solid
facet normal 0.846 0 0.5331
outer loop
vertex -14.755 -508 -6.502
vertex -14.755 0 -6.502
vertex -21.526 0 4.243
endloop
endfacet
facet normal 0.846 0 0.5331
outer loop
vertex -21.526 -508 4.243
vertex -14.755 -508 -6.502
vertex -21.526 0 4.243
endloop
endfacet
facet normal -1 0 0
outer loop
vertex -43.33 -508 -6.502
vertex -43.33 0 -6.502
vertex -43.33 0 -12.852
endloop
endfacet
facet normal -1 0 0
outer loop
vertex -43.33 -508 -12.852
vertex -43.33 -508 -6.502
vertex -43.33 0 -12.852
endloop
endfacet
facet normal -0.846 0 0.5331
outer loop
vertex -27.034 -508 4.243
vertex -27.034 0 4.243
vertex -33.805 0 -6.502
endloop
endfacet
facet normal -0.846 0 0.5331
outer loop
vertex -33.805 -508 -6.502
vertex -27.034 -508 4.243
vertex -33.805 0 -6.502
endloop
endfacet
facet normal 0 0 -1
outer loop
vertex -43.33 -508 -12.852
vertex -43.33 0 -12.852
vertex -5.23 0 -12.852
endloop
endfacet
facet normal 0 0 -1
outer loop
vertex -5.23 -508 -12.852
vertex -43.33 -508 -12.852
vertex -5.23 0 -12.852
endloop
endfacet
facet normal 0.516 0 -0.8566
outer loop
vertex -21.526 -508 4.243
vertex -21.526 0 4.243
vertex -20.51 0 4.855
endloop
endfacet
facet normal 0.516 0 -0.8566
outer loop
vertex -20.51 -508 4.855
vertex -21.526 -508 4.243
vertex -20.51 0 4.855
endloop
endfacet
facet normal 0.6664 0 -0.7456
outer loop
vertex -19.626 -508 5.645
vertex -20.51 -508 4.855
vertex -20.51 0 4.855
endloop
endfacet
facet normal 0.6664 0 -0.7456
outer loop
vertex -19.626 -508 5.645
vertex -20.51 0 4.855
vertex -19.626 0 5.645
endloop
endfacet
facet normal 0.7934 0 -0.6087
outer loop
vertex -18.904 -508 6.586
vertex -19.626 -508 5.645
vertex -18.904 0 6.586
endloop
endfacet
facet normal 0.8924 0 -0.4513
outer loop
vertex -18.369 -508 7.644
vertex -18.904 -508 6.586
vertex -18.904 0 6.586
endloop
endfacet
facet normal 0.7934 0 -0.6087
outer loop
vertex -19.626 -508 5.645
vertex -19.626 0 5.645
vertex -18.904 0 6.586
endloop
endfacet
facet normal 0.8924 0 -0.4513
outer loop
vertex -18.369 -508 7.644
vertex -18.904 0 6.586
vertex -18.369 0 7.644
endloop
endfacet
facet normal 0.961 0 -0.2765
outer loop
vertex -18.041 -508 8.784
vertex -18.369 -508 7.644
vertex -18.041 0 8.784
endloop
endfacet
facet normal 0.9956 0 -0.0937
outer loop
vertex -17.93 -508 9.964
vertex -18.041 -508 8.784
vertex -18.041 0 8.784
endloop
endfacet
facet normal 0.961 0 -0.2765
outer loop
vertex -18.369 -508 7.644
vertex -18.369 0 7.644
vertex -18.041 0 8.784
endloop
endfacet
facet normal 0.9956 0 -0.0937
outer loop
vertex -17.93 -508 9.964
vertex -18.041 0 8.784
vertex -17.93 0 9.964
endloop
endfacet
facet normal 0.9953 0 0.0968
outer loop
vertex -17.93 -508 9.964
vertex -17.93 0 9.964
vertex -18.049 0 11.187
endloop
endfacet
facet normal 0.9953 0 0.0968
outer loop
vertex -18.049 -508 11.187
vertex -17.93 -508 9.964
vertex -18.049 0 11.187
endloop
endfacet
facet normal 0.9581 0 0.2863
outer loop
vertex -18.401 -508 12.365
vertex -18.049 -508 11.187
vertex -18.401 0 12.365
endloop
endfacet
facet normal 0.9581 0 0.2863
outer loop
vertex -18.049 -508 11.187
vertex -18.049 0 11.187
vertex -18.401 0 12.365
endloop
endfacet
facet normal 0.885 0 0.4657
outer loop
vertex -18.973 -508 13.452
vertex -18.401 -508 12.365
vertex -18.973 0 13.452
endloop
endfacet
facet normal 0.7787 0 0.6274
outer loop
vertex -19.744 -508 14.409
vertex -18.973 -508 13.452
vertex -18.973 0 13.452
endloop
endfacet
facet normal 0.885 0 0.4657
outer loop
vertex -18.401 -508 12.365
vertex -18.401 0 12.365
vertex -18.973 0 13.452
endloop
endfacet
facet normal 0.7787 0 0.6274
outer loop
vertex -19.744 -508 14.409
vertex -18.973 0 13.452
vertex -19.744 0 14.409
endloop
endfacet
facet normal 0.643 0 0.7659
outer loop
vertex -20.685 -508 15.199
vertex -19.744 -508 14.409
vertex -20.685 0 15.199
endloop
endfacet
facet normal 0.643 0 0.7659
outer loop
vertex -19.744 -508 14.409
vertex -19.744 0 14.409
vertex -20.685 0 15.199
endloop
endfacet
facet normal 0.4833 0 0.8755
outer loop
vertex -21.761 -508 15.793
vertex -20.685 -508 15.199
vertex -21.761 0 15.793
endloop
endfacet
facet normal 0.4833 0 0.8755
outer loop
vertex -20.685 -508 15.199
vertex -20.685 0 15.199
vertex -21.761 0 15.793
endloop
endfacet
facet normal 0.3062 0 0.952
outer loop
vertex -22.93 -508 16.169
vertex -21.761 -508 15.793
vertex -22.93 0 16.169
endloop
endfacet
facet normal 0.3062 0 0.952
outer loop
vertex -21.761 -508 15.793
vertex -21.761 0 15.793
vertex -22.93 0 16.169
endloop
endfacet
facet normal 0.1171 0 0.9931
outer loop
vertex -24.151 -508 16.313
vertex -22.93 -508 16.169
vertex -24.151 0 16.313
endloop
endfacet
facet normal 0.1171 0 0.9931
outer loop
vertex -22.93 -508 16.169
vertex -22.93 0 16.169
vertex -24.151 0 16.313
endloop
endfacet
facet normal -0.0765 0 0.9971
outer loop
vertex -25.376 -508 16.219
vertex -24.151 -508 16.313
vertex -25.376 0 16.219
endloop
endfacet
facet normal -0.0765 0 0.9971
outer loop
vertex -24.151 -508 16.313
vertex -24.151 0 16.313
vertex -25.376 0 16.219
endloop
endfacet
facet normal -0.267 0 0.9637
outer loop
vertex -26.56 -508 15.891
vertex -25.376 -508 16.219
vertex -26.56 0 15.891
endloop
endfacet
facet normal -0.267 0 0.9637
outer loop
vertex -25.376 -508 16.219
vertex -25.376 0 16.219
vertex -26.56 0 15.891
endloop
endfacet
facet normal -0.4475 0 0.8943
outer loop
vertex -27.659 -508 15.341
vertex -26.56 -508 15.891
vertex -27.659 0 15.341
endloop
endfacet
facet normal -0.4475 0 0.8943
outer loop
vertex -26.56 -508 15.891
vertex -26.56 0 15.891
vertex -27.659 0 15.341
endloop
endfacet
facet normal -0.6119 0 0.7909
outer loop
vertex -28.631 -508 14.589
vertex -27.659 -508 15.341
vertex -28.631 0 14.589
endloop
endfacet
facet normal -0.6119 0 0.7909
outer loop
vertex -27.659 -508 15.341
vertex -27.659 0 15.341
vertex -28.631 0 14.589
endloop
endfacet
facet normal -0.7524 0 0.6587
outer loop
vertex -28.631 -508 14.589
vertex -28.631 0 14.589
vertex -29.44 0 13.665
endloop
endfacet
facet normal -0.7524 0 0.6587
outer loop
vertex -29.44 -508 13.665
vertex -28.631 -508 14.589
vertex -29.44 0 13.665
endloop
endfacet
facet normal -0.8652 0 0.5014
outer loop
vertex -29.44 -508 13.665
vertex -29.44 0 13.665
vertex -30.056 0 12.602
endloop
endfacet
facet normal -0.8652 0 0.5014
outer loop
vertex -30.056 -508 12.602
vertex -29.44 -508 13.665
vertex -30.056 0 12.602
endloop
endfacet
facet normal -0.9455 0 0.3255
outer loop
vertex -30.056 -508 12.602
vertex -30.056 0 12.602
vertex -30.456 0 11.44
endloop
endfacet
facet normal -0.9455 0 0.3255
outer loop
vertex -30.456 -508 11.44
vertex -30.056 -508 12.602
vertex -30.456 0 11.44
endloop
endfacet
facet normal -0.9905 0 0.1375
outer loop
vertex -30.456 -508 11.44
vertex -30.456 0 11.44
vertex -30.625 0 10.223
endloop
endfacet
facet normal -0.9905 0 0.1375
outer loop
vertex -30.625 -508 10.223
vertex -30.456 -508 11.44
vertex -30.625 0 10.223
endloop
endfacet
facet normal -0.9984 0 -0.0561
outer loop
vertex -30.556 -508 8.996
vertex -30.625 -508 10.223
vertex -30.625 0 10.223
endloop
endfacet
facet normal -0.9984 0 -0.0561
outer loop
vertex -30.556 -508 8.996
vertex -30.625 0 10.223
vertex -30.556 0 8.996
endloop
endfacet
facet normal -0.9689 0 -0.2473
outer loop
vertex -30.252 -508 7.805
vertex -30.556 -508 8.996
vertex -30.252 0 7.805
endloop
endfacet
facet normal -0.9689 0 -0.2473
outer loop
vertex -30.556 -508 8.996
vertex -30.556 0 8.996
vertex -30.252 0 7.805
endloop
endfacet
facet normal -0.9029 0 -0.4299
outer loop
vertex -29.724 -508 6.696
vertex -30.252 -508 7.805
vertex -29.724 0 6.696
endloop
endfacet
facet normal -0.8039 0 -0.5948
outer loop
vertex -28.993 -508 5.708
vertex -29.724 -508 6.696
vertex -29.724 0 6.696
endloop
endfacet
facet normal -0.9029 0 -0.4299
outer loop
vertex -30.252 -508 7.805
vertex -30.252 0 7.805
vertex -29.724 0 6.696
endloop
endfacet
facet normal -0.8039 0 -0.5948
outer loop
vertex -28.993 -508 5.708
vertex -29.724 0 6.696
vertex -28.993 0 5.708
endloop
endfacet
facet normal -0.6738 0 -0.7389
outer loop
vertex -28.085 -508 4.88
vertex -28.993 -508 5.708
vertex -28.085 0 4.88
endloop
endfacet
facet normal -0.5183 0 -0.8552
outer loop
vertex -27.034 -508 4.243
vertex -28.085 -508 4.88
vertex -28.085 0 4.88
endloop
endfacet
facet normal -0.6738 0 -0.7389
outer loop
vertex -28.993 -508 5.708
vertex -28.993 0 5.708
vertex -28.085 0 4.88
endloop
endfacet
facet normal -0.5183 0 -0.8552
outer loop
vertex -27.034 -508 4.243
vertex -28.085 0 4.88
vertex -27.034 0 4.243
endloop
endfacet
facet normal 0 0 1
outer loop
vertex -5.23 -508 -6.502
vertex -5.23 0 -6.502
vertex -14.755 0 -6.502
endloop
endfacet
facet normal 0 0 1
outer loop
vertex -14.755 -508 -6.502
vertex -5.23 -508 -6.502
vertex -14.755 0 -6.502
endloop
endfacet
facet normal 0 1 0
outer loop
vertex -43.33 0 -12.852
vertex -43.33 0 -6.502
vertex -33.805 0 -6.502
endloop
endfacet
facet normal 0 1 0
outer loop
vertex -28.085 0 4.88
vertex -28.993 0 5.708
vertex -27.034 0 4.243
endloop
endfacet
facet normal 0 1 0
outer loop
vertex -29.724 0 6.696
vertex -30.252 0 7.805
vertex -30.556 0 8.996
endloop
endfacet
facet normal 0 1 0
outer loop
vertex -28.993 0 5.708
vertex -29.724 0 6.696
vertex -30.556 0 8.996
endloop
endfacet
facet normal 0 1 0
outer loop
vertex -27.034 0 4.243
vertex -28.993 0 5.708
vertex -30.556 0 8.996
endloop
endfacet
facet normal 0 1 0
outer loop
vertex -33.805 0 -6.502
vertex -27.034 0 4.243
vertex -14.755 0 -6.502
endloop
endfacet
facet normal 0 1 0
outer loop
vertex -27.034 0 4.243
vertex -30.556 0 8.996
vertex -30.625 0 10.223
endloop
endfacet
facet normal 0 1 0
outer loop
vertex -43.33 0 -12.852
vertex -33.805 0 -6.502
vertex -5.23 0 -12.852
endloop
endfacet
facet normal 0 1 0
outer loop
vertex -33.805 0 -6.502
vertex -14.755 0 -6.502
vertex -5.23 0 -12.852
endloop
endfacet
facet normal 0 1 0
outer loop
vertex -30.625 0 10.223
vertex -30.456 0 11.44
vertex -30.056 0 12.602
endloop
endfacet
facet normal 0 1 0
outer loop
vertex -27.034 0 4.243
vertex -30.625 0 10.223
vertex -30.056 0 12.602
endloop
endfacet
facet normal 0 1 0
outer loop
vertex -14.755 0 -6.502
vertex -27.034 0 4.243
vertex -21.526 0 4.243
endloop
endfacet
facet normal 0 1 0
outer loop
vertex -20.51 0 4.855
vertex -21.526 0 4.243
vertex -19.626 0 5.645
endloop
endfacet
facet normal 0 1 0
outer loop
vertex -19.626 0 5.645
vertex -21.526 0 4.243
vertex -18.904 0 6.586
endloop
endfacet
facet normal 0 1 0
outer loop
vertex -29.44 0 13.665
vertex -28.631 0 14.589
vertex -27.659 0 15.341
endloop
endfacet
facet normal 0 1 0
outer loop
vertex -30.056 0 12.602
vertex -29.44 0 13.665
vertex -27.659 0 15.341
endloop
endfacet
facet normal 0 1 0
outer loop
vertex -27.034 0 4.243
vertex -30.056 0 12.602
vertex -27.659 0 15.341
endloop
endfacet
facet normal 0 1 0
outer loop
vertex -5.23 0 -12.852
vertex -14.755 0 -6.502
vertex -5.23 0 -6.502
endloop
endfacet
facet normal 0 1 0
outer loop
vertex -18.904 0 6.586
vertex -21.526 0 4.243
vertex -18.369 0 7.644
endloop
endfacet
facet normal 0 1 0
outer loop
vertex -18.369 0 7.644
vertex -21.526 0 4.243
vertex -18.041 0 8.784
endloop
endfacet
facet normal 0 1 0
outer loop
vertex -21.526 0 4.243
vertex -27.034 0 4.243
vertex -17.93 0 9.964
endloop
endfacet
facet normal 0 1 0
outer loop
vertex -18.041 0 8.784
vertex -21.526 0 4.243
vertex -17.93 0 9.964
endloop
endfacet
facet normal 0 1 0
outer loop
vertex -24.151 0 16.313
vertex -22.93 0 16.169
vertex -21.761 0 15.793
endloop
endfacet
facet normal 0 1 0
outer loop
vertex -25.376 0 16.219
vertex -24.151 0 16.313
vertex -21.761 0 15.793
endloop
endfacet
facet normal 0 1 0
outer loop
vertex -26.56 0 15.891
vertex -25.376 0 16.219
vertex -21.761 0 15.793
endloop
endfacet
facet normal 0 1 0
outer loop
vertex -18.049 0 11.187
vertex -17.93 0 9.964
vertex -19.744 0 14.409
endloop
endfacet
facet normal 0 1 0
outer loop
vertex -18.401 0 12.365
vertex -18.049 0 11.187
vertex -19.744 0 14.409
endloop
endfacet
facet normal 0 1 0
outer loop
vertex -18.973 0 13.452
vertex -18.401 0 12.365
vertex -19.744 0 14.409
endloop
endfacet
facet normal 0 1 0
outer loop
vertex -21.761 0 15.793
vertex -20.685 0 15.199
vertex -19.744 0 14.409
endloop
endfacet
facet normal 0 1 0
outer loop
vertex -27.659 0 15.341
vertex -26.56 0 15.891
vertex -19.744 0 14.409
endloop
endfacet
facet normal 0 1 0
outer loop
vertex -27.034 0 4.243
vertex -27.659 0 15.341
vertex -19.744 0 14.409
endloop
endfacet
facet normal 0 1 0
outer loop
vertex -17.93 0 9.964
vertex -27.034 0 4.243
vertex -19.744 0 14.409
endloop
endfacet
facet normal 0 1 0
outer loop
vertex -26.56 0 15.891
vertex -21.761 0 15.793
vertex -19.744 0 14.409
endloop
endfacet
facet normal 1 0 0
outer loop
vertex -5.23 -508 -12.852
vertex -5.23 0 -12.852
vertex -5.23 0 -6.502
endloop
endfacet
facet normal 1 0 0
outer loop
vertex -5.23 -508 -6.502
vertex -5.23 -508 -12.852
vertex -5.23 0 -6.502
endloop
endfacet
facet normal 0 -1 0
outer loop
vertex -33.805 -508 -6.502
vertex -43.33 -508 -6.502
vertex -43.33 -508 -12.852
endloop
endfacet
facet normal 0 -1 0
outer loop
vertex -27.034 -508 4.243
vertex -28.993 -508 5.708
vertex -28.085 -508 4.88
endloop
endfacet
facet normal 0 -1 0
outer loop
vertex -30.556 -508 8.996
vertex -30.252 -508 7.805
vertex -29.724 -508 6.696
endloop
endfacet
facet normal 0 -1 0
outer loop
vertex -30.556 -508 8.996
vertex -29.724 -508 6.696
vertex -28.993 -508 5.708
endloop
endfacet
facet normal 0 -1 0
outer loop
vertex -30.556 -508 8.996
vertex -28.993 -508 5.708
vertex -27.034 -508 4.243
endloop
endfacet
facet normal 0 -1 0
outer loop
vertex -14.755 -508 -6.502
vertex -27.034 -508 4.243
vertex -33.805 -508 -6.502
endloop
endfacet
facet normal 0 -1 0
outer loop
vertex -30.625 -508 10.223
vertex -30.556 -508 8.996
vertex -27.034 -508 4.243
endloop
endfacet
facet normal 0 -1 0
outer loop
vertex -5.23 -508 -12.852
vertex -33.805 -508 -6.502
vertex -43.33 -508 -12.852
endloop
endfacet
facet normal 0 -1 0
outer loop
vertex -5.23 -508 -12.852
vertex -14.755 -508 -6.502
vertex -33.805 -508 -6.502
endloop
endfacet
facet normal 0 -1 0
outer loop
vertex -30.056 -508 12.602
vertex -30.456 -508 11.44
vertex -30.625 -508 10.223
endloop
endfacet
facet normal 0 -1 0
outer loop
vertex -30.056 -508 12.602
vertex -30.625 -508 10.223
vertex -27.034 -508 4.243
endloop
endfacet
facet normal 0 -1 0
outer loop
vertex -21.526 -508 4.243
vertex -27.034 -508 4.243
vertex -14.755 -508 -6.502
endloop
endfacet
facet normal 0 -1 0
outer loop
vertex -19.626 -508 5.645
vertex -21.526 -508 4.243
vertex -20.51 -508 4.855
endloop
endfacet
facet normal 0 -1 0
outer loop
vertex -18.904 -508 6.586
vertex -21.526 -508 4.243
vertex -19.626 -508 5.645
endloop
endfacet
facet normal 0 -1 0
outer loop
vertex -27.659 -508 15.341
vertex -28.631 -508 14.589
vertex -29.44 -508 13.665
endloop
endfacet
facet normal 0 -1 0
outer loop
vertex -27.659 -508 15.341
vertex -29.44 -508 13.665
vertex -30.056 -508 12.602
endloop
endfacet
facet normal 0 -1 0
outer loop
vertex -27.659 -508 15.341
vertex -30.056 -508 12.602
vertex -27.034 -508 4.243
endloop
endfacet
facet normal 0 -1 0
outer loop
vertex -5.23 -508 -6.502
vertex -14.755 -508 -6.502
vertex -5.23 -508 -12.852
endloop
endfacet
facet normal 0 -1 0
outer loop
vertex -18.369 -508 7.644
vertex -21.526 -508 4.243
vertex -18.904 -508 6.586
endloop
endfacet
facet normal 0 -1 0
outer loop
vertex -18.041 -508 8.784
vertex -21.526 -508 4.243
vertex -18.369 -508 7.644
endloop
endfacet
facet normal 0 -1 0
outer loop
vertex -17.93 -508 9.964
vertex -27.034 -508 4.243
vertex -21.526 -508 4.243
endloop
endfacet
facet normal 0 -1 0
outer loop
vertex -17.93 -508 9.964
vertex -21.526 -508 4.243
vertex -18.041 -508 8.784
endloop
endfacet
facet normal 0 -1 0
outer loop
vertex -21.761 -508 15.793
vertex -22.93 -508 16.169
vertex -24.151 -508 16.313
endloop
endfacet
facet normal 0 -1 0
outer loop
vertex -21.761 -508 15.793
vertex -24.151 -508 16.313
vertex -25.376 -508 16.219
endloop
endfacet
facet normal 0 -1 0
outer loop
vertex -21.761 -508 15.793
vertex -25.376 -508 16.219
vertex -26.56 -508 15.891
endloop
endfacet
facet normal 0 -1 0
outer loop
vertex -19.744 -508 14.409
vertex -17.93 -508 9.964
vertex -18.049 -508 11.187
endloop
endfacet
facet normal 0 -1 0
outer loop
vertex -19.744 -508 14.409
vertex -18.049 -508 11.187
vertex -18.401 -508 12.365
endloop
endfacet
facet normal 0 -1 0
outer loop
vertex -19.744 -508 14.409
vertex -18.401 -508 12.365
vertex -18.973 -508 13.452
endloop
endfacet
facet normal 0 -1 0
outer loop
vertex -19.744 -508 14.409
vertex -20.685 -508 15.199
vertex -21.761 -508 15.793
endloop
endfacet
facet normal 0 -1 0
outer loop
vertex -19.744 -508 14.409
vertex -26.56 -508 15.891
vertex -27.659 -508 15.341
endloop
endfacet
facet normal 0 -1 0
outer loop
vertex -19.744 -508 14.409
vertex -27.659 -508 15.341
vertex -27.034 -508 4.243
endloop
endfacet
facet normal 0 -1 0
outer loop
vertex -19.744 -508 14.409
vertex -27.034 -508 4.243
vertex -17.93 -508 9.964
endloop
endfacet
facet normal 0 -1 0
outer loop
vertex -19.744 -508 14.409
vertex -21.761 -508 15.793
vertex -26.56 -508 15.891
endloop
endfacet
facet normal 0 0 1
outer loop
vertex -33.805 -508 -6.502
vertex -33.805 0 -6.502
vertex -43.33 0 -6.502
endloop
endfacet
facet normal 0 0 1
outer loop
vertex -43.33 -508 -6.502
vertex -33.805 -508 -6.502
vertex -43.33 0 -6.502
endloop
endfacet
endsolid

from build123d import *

# Parameters (mm, degrees)
F1_DEPTH = 508


with BuildPart() as f1:
    # F0 (on Front) → F1 (new body)
    with BuildSketch(Plane.XZ):
        with BuildLine():
            ThreePointArc((-21.52567, 4.242823), (-18.903543, 6.585581), (-17.929995, 9.964378))
            ThreePointArc((-17.929995, 9.964378), (-27.658792, 15.34083), (-27.034319, 4.242823))
            ThreePointArc((-27.034319, 4.242823), (-24.279995, 3.614378), (-21.52567, 4.242823))
        make_face()
        with BuildLine():
            ThreePointArc((-21.52567, 4.242823), (-24.279995, 3.614378), (-27.034319, 4.242823))
            Line((-27.034319, 4.242823), (-33.804995, -6.501848))
            Line((-33.804995, -6.501848), (-24.279995, -6.501848))
            Line((-24.279995, -6.501848), (-14.754995, -6.501848))
            Line((-14.754995, -6.501848), (-21.52567, 4.242823))
        make_face()
        Polygon((-24.279995, -6.501848), (-33.804995, -6.501848), (-43.329995, -6.501848), (-43.329995, -12.851848), (-5.229995, -12.851848), (-5.229995, -6.501848), (-14.754995, -6.501848), align=None)
    extrude(amount=F1_DEPTH)


solid = f1.part
